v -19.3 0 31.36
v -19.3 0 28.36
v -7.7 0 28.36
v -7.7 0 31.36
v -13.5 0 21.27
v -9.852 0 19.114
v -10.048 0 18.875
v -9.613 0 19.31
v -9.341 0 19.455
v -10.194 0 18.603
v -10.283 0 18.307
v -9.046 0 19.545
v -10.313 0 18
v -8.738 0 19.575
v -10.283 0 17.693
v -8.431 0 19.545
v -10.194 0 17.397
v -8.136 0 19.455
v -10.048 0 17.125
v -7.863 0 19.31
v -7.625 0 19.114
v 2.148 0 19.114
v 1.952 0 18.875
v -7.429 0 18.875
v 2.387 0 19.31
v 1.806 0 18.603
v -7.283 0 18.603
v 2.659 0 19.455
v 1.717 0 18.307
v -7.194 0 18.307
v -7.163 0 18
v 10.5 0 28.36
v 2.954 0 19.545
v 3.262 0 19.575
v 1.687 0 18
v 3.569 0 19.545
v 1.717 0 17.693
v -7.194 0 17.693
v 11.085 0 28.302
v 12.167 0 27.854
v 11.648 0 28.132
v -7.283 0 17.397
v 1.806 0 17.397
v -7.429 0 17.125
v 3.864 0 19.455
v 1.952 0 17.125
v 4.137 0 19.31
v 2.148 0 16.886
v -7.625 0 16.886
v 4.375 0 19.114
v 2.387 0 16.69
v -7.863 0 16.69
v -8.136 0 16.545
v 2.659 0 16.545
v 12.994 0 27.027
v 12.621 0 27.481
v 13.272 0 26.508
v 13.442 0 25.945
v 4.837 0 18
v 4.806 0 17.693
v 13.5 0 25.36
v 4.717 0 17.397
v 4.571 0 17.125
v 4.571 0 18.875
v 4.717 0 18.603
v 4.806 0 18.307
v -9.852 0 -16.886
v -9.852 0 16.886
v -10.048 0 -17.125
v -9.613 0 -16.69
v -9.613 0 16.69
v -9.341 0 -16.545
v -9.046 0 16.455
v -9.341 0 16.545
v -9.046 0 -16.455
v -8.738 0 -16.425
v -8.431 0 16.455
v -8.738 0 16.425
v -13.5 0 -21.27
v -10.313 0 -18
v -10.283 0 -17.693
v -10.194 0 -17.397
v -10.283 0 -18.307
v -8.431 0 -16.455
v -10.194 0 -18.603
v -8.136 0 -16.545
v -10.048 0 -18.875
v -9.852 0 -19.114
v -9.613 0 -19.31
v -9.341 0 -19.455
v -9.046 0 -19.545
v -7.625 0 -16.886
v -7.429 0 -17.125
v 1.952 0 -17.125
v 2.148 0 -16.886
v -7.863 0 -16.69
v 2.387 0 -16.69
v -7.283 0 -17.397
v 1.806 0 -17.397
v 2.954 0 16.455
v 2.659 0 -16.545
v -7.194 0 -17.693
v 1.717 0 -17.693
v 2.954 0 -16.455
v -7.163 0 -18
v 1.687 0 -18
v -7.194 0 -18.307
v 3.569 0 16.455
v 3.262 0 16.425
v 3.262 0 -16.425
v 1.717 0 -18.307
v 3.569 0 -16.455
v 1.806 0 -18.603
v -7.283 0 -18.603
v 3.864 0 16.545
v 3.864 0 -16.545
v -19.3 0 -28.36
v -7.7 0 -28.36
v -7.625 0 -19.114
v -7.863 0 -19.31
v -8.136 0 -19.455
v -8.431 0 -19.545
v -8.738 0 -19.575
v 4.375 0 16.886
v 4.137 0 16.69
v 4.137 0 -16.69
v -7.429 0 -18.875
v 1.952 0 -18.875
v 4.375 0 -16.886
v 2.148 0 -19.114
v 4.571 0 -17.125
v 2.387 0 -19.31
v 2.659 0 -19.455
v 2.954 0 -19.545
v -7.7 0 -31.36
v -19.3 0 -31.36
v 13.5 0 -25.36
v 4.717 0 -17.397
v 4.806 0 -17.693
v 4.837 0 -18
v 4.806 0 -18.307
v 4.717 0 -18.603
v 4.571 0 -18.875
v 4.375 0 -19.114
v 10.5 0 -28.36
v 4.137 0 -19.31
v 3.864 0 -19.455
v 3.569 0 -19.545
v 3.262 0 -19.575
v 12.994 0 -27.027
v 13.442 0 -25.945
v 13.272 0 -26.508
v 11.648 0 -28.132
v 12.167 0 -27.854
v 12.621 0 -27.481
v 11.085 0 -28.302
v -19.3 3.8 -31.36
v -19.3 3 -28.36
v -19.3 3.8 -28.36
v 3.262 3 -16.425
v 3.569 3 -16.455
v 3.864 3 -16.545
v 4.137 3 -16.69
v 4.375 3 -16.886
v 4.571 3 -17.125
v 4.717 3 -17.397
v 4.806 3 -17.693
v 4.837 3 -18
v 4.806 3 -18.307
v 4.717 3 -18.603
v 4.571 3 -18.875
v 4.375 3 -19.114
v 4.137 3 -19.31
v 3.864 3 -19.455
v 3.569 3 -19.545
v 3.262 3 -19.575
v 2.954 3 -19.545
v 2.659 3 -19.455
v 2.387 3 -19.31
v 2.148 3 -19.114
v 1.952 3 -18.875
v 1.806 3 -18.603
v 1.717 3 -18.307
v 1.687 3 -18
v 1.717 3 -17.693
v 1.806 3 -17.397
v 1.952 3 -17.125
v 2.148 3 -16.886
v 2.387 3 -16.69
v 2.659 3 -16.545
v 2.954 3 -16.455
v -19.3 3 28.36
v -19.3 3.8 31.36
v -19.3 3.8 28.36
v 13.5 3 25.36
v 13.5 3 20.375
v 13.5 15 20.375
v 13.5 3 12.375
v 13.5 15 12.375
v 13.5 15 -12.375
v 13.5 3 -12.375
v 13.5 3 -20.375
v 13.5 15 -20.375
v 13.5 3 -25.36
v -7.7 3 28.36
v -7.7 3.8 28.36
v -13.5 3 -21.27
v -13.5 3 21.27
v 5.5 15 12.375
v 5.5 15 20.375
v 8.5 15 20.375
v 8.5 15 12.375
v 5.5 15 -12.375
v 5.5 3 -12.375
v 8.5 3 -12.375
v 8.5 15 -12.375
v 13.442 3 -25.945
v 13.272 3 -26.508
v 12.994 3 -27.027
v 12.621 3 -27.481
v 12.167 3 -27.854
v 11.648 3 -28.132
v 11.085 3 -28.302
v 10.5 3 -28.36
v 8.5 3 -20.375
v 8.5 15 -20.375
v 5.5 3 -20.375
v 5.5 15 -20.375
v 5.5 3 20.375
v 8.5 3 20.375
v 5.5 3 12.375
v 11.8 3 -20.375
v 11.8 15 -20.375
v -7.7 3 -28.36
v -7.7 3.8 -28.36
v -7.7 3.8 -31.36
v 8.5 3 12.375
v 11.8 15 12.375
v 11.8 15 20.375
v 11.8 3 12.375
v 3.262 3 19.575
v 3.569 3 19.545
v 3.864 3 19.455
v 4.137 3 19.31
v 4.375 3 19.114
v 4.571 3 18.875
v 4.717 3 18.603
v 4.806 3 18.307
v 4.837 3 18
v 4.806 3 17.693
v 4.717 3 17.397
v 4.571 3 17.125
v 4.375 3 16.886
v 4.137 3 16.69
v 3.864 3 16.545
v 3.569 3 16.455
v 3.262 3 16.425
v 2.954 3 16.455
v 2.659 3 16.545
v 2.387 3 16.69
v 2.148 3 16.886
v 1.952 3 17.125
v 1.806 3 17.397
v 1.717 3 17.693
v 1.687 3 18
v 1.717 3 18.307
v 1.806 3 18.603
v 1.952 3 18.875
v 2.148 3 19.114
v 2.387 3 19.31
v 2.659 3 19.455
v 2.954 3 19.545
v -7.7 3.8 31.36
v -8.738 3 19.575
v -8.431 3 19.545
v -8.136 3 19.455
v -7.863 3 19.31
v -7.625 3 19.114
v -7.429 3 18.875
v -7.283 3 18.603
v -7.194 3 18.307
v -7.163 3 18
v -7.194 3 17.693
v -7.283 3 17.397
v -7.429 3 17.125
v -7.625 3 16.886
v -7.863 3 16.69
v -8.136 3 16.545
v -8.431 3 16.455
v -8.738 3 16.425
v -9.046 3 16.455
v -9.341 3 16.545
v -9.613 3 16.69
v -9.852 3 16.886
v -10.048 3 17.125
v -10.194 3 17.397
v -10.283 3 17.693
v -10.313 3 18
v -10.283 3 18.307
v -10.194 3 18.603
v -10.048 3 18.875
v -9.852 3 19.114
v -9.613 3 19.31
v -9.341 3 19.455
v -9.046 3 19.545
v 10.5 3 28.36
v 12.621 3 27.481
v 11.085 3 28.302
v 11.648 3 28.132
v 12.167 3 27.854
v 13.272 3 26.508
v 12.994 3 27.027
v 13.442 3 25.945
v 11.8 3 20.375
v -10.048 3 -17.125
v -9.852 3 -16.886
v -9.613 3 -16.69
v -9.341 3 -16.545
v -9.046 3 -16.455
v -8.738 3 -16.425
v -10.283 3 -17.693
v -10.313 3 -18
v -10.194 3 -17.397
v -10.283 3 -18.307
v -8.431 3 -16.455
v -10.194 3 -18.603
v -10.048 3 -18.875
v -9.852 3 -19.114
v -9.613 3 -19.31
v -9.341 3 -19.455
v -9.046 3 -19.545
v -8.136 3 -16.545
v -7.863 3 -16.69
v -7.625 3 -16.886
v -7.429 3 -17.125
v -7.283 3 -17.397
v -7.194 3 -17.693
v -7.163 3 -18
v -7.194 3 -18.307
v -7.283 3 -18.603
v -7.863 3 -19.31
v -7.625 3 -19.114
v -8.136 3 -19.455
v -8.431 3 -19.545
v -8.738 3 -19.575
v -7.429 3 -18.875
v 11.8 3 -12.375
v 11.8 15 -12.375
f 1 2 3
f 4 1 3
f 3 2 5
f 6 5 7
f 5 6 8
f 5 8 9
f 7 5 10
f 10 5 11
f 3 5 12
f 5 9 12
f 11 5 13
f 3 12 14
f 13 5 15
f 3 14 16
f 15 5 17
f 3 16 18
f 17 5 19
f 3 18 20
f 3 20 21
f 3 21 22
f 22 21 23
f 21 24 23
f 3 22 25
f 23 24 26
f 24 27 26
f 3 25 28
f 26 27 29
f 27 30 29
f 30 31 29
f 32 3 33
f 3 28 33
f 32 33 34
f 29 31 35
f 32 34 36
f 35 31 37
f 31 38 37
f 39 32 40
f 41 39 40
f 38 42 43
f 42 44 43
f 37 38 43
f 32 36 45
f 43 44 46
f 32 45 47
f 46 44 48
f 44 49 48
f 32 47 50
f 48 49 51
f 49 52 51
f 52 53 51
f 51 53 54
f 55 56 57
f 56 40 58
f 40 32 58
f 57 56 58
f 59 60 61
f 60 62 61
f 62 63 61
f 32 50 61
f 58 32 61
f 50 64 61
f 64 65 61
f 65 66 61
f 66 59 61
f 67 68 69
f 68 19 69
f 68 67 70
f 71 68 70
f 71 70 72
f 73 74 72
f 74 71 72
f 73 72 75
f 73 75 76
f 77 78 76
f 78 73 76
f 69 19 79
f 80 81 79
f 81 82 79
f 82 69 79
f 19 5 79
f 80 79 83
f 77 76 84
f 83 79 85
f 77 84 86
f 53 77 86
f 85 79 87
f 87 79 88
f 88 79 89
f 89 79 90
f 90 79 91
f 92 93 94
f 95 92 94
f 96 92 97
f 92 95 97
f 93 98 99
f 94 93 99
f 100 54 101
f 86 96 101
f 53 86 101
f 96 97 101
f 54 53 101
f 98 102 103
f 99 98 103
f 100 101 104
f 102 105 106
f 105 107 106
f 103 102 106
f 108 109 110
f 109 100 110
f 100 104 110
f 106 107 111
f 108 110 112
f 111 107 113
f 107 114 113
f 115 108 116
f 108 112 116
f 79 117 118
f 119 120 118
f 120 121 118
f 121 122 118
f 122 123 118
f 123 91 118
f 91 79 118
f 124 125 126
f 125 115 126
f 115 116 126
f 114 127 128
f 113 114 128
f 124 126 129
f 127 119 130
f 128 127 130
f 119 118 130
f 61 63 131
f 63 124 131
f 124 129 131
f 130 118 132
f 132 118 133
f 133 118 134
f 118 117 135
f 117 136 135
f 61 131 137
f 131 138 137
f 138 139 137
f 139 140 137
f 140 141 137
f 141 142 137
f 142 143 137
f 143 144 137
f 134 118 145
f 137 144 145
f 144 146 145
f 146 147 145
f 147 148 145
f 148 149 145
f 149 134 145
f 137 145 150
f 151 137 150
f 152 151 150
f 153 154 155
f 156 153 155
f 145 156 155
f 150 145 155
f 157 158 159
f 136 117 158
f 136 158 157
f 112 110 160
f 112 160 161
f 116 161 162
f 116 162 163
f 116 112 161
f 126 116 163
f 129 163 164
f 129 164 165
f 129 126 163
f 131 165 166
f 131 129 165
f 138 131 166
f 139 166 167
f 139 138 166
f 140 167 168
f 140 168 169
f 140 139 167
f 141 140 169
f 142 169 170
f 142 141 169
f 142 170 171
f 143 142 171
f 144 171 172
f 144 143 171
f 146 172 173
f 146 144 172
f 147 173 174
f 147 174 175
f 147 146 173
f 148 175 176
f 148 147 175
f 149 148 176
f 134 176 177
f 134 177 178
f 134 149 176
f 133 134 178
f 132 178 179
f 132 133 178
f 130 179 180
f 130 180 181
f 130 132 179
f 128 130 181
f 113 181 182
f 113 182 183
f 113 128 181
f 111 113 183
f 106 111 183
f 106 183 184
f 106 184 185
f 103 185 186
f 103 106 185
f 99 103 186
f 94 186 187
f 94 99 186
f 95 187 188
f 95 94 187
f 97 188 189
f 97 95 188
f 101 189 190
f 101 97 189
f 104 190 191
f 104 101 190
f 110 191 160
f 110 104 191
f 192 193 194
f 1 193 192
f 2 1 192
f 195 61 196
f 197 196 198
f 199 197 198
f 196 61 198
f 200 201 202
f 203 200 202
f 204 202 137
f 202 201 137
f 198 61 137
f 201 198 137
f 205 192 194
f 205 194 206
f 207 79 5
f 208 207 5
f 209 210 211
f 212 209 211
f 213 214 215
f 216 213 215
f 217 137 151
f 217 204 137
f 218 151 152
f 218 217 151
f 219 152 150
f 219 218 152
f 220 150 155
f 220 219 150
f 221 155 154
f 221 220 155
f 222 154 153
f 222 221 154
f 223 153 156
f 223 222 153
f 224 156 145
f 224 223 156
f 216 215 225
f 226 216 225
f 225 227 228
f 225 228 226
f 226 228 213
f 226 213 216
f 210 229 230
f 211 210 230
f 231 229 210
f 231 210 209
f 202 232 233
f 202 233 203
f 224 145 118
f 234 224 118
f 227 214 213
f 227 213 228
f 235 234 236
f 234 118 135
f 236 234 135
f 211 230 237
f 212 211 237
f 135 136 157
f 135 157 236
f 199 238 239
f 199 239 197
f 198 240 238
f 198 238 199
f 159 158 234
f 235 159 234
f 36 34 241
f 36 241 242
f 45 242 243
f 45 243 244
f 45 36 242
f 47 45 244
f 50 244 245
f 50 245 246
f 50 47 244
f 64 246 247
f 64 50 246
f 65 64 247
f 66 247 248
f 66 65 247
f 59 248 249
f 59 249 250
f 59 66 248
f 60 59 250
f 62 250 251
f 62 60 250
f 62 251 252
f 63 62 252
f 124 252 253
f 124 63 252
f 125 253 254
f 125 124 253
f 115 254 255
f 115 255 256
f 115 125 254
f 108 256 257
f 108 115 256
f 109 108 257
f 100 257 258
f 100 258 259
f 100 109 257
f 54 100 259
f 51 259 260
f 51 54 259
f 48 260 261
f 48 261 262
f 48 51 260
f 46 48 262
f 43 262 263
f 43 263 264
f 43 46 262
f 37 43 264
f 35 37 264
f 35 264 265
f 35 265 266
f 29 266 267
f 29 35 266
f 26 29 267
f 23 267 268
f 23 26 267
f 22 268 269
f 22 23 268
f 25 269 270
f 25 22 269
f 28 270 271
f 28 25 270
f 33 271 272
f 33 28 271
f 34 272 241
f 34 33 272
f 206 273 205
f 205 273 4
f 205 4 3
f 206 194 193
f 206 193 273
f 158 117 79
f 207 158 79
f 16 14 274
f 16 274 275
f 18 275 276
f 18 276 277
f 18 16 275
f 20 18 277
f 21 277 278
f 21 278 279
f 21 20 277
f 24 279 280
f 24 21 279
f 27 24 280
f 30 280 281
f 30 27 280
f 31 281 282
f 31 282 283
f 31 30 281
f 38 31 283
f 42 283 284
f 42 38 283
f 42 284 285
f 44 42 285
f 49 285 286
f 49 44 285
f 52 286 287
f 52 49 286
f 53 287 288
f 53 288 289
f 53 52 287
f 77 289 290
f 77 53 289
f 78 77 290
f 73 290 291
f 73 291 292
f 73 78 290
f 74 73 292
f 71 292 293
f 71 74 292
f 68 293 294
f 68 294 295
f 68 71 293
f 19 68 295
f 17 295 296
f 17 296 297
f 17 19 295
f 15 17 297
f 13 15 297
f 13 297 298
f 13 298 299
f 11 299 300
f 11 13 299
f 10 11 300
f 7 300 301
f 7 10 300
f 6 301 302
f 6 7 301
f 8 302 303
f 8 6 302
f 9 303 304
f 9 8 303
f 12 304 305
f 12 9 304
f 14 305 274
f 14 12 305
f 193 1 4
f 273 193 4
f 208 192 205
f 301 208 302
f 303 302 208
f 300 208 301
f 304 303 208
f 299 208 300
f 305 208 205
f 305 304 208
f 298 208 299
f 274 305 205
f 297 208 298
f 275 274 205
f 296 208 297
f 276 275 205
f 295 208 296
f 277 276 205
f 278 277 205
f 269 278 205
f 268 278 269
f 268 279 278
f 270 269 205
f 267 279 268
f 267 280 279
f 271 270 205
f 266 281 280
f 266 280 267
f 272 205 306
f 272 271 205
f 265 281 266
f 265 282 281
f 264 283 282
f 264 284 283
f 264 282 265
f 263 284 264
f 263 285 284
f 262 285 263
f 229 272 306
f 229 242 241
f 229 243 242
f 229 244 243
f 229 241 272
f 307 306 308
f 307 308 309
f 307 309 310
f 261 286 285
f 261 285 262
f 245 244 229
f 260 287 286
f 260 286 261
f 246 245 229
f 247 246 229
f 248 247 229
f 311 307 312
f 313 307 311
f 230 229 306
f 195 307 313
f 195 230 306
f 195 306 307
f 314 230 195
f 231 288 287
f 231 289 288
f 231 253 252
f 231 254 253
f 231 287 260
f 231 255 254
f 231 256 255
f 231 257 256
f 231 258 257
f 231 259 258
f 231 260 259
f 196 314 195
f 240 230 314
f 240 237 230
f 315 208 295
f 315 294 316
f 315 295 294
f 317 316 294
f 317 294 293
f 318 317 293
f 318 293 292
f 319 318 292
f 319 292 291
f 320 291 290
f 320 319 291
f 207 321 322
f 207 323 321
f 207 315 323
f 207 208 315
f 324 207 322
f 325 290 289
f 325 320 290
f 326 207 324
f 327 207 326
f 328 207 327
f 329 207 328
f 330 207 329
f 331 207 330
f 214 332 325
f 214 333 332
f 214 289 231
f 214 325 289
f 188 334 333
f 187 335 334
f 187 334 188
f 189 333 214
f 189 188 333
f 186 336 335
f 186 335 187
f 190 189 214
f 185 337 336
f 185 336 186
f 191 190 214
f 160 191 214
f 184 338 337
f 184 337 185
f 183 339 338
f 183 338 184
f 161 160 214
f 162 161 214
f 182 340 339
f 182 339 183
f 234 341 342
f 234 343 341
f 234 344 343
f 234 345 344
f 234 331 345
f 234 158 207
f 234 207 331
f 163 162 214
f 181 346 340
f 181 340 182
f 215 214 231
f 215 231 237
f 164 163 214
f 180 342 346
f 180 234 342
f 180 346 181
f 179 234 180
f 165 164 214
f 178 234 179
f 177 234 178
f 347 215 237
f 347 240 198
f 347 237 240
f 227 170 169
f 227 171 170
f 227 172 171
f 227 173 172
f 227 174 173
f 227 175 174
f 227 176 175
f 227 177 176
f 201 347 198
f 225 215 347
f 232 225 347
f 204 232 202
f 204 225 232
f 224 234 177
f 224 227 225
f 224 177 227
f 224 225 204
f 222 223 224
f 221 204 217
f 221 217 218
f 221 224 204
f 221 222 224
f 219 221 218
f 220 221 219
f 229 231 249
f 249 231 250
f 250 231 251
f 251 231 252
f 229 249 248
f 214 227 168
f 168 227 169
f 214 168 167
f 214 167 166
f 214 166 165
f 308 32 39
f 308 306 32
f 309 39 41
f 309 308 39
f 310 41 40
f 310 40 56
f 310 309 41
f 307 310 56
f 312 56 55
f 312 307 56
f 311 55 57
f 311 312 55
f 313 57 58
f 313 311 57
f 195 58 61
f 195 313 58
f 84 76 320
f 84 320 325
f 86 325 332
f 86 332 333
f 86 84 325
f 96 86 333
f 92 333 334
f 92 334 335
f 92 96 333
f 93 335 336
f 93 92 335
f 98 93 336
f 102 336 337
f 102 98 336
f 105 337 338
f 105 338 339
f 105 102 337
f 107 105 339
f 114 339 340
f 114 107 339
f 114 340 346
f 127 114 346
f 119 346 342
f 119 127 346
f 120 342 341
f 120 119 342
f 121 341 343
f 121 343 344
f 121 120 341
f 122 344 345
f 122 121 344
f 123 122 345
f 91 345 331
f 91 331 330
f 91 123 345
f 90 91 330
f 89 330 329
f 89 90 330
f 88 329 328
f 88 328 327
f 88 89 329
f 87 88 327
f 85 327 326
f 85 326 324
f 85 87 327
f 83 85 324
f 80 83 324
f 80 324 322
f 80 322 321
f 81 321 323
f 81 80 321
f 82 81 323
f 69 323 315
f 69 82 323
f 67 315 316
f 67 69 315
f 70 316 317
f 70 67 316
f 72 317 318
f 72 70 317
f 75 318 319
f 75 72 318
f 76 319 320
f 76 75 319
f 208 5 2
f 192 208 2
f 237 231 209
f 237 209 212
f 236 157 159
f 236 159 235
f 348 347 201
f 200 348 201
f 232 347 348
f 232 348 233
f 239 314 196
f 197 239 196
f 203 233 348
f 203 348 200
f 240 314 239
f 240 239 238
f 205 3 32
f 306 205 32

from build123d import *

# Parameters (mm, degrees)
SKETCH1_R           = 1.575
SKETCH1_W           = 3
SKETCH1_H           = 8
BOSS_EXTRUDE1_DEPTH = 3
SKETCH1_3_W         = 3
SKETCH1_3_H         = 8
SKETCH1_3_W_2       = 1.7
BOSS_EXTRUDE2_DEPTH = 15
SKETCH1_4_W         = 11.6
SKETCH1_4_H         = 3
BOSS_EXTRUDE3_DEPTH = 3.8
FILLET1_R           = 3


with BuildPart() as part:
    # Sketch1 → Boss-Extrude1 (new body)
    with BuildSketch(Plane(origin=(0, 0, 0), x_dir=(1, 0, 0), z_dir=(0, 1, 0))):
        Polygon((-13.5, -21.27), (-19.3, -28.36), (13.5, -28.36), (13.5, -20.375), (11.8, -20.375), (11.8, -12.375), (13.5, -12.375), (13.5, 12.375), (11.8, 12.375), (11.8, 20.375), (13.5, 20.375), (13.5, 28.36), (-19.3, 28.36), (-13.5, 21.27), align=None)
        with Locations((-8.738402562, -18)):
            Circle(SKETCH1_R, mode=Mode.SUBTRACT)
        with Locations((3.261597438, -18)):
            Circle(SKETCH1_R, mode=Mode.SUBTRACT)
        with Locations((7, -16.375)):
            Rectangle(SKETCH1_W, SKETCH1_H, mode=Mode.SUBTRACT)
        with Locations((7, 16.375)):
            Rectangle(SKETCH1_W, SKETCH1_H, mode=Mode.SUBTRACT)
        with Locations((-8.738402562, 18)):
            Circle(SKETCH1_R, mode=Mode.SUBTRACT)
        with Locations((3.261597438, 18)):
            Circle(SKETCH1_R, mode=Mode.SUBTRACT)
    extrude(amount=BOSS_EXTRUDE1_DEPTH)

    # Sketch1<3> → Boss-Extrude2 (add)
    with BuildSketch(Plane(origin=(0, 0, 0), x_dir=(1, 0, 0), z_dir=(0, 1, 0))):
        with Locations((7, -16.375)):
            Rectangle(SKETCH1_3_W, SKETCH1_3_H)
        with Locations((12.65, -16.375)):
            Rectangle(SKETCH1_3_W_2, SKETCH1_3_H)
        with Locations((12.65, 16.375)):
            Rectangle(SKETCH1_3_W_2, SKETCH1_3_H)
        with Locations((7, 16.375)):
            Rectangle(SKETCH1_3_W, SKETCH1_3_H)
    extrude(amount=BOSS_EXTRUDE2_DEPTH)

    # Sketch1<4> → Boss-Extrude3 (add)
    with BuildSketch(Plane(origin=(0, 0, 0), x_dir=(1, 0, 0), z_dir=(0, 1, 0))):
        with Locations((-13.5, -29.86)):
            Rectangle(SKETCH1_4_W, SKETCH1_4_H)
        with Locations((-13.5, 29.86)):
            Rectangle(SKETCH1_4_W, SKETCH1_4_H)
    extrude(amount=BOSS_EXTRUDE3_DEPTH)

    # Fillet1
    fillet1_edges = [part.edges().sort_by_distance(p)[0] for p in [
        (13.5, 1.5, -28.36),
        (13.5, 1.5, 28.36),
    ]]
    fillet(fillet1_edges, radius=FILLET1_R)


solid = part.part
